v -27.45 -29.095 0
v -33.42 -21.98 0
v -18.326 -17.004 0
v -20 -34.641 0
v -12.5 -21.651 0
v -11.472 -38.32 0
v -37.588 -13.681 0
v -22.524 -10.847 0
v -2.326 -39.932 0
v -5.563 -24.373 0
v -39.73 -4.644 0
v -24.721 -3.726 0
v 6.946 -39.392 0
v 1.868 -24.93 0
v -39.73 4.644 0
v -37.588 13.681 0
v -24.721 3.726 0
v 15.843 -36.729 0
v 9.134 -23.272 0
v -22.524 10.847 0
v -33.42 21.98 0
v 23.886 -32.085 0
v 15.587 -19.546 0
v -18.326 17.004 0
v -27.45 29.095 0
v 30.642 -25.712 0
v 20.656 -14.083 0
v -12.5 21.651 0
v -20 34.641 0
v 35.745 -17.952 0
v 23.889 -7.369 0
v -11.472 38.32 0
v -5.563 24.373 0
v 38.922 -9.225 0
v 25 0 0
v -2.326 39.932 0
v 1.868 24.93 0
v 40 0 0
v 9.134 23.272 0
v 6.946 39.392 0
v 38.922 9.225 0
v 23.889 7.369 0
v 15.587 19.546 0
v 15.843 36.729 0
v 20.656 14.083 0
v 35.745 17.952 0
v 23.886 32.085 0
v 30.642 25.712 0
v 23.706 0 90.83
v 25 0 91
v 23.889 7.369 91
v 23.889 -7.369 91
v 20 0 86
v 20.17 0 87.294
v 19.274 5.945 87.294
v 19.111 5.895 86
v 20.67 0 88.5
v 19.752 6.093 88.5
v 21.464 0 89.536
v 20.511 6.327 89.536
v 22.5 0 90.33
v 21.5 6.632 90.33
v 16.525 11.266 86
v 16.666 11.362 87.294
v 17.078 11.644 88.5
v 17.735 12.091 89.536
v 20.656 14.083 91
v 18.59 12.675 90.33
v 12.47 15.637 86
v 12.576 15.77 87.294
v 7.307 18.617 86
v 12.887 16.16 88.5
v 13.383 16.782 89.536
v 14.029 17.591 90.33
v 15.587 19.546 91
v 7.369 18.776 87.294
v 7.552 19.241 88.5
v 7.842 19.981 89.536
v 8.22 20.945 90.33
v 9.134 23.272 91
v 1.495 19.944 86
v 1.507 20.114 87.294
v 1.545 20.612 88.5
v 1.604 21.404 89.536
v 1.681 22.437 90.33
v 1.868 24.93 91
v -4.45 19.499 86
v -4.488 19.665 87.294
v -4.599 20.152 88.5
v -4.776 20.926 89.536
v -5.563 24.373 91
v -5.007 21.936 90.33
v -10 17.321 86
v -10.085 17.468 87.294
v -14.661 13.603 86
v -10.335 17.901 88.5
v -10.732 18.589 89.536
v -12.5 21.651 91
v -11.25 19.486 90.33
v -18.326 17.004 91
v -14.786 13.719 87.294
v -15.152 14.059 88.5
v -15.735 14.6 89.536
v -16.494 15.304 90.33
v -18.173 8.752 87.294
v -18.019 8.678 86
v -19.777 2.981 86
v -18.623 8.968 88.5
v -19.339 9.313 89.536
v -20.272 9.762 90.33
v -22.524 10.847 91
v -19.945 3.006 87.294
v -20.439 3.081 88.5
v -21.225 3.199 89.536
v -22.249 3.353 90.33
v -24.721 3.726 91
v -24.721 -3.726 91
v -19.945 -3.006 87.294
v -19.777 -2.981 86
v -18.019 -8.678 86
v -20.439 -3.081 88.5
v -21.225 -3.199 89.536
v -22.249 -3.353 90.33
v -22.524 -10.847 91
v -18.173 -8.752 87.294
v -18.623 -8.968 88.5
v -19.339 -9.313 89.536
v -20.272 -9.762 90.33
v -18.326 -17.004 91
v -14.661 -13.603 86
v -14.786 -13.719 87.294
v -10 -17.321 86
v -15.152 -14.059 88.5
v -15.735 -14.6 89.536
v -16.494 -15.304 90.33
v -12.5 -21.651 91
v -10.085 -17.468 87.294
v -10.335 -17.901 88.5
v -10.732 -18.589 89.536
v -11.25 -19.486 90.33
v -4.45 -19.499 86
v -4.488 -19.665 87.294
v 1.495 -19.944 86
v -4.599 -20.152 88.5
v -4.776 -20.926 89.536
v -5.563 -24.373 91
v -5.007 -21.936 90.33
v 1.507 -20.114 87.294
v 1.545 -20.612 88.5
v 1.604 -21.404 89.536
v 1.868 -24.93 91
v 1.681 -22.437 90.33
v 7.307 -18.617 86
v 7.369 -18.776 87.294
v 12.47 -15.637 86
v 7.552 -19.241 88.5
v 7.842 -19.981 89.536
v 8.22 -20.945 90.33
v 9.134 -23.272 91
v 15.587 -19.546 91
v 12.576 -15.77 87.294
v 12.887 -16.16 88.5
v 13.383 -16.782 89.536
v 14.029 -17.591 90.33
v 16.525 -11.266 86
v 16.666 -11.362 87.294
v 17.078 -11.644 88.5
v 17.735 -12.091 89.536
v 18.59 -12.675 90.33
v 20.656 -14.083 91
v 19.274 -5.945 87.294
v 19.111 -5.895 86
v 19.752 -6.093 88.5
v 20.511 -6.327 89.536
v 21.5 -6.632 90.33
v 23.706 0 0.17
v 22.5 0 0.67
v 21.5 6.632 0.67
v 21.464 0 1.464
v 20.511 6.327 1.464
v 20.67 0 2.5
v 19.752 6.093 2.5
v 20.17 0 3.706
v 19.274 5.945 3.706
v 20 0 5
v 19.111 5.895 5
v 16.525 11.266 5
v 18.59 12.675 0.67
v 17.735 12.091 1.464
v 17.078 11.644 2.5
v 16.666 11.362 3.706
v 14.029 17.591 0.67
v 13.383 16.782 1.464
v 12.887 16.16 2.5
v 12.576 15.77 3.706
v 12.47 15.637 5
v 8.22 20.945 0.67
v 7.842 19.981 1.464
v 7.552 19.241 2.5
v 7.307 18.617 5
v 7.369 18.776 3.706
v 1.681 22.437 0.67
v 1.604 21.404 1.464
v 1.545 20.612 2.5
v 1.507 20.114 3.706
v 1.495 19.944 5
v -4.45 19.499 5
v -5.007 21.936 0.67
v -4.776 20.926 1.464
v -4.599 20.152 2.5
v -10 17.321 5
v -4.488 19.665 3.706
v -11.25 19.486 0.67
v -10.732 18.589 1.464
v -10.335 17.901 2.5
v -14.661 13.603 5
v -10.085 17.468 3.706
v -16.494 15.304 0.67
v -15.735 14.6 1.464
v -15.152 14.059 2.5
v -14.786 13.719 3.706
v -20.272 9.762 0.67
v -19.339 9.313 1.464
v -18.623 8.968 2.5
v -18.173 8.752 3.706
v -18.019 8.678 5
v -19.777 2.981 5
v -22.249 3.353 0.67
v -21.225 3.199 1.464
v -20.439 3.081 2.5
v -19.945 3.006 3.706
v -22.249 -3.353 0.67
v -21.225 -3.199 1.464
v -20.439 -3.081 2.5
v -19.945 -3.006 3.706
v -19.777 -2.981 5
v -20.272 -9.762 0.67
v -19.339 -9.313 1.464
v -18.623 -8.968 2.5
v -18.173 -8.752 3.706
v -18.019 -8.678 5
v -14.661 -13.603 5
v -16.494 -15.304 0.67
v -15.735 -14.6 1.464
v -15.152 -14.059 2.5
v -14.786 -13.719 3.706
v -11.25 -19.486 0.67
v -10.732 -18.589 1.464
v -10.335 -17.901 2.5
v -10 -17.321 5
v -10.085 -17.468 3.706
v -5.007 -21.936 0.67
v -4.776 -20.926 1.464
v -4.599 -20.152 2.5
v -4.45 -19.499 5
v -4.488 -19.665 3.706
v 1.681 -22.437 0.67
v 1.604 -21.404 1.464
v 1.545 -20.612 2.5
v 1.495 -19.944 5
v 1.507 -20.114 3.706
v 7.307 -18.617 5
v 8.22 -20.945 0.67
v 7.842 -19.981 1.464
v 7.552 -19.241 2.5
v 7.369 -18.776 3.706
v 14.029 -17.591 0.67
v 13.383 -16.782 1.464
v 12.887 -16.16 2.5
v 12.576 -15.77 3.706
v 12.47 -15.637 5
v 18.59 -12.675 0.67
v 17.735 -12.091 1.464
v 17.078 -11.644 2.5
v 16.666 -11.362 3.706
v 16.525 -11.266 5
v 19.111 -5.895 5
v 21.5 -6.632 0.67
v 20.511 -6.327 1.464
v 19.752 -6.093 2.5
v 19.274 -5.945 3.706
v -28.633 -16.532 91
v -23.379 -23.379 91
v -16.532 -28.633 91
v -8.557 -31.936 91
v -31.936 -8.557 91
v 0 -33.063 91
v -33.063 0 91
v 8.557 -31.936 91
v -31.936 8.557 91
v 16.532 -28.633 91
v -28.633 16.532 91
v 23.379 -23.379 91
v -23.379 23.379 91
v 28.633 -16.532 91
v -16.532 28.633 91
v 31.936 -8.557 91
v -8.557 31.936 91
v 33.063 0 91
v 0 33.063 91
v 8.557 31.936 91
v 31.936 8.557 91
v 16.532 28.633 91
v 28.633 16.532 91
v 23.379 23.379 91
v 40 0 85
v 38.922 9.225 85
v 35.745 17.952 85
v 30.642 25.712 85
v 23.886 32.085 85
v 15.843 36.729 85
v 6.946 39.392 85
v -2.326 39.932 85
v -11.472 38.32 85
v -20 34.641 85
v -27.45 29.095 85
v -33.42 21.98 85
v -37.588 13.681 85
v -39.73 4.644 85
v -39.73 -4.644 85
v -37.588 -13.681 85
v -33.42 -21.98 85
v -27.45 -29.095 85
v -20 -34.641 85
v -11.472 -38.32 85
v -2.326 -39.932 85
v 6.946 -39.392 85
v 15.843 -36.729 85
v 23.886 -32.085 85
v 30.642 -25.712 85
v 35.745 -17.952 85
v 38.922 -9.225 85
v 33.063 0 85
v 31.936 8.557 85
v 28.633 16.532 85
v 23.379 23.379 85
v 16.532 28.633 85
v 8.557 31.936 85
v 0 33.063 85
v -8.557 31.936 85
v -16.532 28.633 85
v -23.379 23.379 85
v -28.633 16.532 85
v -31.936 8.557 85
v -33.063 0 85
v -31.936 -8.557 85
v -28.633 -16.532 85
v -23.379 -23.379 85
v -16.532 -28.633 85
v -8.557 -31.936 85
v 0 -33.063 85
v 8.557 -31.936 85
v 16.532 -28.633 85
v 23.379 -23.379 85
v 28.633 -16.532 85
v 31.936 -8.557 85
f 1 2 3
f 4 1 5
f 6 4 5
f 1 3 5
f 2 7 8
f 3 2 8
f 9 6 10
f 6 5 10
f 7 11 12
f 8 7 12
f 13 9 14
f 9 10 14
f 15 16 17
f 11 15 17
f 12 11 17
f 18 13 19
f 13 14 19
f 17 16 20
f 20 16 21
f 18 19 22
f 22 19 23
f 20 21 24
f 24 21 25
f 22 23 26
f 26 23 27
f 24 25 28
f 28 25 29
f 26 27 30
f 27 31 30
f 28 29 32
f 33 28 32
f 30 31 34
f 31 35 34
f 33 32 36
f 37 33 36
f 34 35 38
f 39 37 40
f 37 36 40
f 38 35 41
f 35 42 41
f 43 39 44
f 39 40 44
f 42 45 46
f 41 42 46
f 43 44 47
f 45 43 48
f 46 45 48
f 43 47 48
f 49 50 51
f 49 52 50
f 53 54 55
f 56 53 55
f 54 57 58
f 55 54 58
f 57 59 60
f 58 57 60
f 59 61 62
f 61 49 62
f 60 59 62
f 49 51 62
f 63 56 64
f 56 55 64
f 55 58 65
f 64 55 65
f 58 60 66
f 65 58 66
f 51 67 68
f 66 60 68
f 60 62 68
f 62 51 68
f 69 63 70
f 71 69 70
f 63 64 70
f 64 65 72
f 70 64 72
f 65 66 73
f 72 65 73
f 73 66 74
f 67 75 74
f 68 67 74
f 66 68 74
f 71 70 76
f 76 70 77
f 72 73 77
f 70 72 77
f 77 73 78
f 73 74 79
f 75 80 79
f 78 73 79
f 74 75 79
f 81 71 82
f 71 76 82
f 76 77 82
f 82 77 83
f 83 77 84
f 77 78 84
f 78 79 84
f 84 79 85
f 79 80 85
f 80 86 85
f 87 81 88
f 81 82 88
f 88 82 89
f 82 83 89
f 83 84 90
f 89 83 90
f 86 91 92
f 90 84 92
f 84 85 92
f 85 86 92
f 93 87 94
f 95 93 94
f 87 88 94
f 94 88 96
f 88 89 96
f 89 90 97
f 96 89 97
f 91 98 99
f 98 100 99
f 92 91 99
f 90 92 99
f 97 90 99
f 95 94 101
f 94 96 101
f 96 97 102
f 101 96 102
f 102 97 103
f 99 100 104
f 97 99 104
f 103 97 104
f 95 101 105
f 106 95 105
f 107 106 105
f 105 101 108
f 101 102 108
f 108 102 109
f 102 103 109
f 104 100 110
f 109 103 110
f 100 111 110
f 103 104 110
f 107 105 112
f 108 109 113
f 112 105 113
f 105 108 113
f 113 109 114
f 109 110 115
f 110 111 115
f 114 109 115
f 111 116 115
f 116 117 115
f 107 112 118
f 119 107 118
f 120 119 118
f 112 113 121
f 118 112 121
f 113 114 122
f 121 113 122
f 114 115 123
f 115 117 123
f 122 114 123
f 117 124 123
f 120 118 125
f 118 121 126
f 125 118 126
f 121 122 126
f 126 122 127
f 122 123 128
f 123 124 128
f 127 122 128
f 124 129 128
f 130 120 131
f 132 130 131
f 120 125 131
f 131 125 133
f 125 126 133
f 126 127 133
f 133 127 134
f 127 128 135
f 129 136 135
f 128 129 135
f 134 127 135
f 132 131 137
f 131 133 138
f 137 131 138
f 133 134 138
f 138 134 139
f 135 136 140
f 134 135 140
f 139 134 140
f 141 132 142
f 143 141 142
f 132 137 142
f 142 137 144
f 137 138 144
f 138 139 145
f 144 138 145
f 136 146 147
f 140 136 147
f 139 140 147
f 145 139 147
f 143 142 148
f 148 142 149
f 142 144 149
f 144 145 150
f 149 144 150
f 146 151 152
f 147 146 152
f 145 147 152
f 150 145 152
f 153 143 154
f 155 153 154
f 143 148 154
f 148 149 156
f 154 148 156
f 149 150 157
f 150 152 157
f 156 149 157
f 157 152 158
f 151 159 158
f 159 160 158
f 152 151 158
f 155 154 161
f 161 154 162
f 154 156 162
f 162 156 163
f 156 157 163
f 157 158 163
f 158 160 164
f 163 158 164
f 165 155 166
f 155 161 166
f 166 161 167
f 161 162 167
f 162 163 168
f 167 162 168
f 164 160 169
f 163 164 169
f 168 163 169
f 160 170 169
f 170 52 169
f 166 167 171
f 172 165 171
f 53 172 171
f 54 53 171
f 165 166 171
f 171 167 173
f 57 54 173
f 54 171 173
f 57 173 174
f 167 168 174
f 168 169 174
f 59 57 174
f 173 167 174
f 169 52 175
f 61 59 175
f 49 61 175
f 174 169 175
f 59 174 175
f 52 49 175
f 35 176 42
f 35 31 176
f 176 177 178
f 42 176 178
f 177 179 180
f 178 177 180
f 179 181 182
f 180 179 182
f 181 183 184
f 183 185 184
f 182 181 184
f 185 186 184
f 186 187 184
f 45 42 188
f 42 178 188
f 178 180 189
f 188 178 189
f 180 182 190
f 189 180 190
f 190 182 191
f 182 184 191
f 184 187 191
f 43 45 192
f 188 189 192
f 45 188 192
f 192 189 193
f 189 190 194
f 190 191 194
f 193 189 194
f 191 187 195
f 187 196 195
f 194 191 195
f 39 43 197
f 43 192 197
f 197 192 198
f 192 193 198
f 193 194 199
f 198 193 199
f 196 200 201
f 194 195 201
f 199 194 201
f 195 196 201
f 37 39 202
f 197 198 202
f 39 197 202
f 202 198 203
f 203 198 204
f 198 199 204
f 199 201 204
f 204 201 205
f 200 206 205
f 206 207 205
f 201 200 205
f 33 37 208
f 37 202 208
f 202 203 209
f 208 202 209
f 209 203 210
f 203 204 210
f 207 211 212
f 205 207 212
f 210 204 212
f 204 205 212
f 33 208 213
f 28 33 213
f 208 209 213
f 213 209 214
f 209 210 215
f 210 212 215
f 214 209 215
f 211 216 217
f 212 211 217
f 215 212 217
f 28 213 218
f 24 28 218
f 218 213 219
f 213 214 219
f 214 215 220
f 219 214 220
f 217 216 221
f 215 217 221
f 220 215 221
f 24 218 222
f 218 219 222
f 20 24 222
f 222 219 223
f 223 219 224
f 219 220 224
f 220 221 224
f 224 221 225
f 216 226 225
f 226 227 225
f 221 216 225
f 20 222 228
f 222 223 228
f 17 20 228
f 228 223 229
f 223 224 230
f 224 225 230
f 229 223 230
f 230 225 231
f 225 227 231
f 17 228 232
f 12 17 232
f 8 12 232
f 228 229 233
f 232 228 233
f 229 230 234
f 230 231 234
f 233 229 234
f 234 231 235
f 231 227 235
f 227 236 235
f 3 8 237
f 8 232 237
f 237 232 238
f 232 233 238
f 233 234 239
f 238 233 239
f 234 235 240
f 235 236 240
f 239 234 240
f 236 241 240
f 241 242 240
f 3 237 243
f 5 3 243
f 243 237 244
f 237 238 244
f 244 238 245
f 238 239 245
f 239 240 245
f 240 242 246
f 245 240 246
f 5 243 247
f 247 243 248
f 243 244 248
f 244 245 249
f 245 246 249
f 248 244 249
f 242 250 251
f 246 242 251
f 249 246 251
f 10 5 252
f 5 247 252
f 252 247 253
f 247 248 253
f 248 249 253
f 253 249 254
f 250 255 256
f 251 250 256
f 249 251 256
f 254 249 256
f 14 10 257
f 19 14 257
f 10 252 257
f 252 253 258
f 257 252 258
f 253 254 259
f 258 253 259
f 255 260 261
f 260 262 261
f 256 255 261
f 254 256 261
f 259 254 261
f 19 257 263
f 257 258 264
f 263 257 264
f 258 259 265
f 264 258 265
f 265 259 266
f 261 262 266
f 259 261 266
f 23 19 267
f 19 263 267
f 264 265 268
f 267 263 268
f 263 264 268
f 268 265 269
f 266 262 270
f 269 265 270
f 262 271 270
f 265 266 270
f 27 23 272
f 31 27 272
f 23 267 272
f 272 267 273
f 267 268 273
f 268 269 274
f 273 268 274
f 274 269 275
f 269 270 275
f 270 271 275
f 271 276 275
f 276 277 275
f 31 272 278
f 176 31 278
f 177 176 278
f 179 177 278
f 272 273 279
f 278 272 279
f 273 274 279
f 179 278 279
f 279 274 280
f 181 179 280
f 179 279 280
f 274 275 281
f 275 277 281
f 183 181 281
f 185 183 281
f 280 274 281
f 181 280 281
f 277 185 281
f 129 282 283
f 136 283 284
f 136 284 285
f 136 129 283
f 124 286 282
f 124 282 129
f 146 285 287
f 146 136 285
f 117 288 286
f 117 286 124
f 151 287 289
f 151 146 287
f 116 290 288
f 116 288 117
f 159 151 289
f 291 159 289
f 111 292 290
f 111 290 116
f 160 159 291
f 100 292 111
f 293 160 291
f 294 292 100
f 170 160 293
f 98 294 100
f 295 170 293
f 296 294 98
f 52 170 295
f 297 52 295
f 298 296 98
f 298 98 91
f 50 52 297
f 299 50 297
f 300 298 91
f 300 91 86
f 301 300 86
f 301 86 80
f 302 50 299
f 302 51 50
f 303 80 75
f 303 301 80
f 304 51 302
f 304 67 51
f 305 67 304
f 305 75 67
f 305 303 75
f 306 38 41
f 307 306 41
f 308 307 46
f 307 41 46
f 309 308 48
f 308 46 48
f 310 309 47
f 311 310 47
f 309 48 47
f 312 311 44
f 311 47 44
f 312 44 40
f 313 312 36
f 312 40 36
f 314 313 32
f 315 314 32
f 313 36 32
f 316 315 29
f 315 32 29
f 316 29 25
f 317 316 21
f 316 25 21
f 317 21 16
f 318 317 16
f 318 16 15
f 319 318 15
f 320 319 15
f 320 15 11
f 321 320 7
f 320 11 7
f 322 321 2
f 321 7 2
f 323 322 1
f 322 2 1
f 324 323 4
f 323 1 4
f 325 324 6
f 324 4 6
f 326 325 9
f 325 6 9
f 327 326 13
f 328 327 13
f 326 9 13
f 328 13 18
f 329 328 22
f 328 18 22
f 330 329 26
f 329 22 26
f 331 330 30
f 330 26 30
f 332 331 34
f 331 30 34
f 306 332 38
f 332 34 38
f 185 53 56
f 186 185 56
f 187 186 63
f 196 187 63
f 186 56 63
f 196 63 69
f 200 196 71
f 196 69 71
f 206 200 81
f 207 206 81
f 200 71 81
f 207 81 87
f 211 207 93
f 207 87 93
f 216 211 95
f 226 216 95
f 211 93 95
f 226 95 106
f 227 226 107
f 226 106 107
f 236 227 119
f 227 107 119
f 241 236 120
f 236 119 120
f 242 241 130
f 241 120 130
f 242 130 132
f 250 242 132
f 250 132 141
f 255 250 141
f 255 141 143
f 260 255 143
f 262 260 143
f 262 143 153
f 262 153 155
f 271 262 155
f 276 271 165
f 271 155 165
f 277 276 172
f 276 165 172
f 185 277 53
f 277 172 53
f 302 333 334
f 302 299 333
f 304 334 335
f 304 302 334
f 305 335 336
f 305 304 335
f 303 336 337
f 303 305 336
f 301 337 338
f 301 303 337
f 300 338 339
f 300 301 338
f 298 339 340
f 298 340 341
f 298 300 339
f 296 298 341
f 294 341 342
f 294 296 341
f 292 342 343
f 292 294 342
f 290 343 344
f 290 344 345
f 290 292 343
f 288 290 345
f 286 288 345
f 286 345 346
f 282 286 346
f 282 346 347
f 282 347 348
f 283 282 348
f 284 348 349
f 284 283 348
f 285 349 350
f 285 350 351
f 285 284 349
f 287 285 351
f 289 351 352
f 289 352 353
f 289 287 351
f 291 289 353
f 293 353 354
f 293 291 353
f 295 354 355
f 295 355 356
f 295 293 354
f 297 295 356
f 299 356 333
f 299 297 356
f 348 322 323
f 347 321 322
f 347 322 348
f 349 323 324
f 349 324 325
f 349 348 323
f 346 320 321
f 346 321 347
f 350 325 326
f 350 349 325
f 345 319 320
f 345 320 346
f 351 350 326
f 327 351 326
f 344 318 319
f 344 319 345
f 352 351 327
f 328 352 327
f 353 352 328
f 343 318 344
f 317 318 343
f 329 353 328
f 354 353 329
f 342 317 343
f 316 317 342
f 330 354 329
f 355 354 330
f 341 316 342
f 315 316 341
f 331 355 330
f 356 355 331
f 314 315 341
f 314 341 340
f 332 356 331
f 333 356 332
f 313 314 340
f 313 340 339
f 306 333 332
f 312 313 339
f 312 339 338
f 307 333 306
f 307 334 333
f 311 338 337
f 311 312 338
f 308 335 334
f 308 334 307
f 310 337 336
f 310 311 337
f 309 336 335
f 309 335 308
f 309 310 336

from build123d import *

# Parameters (mm, degrees)
F0_R     = 40
F1_DEPTH = 85
F2_R     = 20
F3_DEPTH = 88
F4_R     = 5
F5_R     = 33.0630902993
F5_R_2   = 20
F6_DEPTH = 6
F7_R     = 5


with BuildPart() as f1:
    # F0 (on Top) → F1 (new body)
    with BuildSketch(Plane.XY):
        Circle(F0_R)
    extrude(amount=F1_DEPTH)

    # F2 (on face) → F3 (cut)
    with BuildSketch(Plane.XY.offset(85)):
        Circle(F2_R)
    extrude(amount=-F3_DEPTH, mode=Mode.SUBTRACT)

    # F4
    f4_edges = [f1.edges().sort_by_distance(p)[0] for p in [
        (-20, 0, 0),
    ]]
    fillet(f4_edges, radius=F4_R)

    # F5 (on face) → F6 (join, symmetric)
    with BuildSketch(Plane.XY.offset(85)):
        Circle(F5_R)
        Circle(F5_R_2, mode=Mode.SUBTRACT)
    extrude(amount=F6_DEPTH, both=True)

    # F7
    f7_edges = [f1.edges().sort_by_distance(p)[0] for p in [
        (-20, 0, 79),
        (20, 0, 42),
        (-20, 0, 5),
        (-20, 0, 85),
        (20, 0, 82),
        (20, 0, 88),
        (-20, 0, 91),
    ]]
    fillet(f7_edges, radius=F7_R)


solid = f1.part
